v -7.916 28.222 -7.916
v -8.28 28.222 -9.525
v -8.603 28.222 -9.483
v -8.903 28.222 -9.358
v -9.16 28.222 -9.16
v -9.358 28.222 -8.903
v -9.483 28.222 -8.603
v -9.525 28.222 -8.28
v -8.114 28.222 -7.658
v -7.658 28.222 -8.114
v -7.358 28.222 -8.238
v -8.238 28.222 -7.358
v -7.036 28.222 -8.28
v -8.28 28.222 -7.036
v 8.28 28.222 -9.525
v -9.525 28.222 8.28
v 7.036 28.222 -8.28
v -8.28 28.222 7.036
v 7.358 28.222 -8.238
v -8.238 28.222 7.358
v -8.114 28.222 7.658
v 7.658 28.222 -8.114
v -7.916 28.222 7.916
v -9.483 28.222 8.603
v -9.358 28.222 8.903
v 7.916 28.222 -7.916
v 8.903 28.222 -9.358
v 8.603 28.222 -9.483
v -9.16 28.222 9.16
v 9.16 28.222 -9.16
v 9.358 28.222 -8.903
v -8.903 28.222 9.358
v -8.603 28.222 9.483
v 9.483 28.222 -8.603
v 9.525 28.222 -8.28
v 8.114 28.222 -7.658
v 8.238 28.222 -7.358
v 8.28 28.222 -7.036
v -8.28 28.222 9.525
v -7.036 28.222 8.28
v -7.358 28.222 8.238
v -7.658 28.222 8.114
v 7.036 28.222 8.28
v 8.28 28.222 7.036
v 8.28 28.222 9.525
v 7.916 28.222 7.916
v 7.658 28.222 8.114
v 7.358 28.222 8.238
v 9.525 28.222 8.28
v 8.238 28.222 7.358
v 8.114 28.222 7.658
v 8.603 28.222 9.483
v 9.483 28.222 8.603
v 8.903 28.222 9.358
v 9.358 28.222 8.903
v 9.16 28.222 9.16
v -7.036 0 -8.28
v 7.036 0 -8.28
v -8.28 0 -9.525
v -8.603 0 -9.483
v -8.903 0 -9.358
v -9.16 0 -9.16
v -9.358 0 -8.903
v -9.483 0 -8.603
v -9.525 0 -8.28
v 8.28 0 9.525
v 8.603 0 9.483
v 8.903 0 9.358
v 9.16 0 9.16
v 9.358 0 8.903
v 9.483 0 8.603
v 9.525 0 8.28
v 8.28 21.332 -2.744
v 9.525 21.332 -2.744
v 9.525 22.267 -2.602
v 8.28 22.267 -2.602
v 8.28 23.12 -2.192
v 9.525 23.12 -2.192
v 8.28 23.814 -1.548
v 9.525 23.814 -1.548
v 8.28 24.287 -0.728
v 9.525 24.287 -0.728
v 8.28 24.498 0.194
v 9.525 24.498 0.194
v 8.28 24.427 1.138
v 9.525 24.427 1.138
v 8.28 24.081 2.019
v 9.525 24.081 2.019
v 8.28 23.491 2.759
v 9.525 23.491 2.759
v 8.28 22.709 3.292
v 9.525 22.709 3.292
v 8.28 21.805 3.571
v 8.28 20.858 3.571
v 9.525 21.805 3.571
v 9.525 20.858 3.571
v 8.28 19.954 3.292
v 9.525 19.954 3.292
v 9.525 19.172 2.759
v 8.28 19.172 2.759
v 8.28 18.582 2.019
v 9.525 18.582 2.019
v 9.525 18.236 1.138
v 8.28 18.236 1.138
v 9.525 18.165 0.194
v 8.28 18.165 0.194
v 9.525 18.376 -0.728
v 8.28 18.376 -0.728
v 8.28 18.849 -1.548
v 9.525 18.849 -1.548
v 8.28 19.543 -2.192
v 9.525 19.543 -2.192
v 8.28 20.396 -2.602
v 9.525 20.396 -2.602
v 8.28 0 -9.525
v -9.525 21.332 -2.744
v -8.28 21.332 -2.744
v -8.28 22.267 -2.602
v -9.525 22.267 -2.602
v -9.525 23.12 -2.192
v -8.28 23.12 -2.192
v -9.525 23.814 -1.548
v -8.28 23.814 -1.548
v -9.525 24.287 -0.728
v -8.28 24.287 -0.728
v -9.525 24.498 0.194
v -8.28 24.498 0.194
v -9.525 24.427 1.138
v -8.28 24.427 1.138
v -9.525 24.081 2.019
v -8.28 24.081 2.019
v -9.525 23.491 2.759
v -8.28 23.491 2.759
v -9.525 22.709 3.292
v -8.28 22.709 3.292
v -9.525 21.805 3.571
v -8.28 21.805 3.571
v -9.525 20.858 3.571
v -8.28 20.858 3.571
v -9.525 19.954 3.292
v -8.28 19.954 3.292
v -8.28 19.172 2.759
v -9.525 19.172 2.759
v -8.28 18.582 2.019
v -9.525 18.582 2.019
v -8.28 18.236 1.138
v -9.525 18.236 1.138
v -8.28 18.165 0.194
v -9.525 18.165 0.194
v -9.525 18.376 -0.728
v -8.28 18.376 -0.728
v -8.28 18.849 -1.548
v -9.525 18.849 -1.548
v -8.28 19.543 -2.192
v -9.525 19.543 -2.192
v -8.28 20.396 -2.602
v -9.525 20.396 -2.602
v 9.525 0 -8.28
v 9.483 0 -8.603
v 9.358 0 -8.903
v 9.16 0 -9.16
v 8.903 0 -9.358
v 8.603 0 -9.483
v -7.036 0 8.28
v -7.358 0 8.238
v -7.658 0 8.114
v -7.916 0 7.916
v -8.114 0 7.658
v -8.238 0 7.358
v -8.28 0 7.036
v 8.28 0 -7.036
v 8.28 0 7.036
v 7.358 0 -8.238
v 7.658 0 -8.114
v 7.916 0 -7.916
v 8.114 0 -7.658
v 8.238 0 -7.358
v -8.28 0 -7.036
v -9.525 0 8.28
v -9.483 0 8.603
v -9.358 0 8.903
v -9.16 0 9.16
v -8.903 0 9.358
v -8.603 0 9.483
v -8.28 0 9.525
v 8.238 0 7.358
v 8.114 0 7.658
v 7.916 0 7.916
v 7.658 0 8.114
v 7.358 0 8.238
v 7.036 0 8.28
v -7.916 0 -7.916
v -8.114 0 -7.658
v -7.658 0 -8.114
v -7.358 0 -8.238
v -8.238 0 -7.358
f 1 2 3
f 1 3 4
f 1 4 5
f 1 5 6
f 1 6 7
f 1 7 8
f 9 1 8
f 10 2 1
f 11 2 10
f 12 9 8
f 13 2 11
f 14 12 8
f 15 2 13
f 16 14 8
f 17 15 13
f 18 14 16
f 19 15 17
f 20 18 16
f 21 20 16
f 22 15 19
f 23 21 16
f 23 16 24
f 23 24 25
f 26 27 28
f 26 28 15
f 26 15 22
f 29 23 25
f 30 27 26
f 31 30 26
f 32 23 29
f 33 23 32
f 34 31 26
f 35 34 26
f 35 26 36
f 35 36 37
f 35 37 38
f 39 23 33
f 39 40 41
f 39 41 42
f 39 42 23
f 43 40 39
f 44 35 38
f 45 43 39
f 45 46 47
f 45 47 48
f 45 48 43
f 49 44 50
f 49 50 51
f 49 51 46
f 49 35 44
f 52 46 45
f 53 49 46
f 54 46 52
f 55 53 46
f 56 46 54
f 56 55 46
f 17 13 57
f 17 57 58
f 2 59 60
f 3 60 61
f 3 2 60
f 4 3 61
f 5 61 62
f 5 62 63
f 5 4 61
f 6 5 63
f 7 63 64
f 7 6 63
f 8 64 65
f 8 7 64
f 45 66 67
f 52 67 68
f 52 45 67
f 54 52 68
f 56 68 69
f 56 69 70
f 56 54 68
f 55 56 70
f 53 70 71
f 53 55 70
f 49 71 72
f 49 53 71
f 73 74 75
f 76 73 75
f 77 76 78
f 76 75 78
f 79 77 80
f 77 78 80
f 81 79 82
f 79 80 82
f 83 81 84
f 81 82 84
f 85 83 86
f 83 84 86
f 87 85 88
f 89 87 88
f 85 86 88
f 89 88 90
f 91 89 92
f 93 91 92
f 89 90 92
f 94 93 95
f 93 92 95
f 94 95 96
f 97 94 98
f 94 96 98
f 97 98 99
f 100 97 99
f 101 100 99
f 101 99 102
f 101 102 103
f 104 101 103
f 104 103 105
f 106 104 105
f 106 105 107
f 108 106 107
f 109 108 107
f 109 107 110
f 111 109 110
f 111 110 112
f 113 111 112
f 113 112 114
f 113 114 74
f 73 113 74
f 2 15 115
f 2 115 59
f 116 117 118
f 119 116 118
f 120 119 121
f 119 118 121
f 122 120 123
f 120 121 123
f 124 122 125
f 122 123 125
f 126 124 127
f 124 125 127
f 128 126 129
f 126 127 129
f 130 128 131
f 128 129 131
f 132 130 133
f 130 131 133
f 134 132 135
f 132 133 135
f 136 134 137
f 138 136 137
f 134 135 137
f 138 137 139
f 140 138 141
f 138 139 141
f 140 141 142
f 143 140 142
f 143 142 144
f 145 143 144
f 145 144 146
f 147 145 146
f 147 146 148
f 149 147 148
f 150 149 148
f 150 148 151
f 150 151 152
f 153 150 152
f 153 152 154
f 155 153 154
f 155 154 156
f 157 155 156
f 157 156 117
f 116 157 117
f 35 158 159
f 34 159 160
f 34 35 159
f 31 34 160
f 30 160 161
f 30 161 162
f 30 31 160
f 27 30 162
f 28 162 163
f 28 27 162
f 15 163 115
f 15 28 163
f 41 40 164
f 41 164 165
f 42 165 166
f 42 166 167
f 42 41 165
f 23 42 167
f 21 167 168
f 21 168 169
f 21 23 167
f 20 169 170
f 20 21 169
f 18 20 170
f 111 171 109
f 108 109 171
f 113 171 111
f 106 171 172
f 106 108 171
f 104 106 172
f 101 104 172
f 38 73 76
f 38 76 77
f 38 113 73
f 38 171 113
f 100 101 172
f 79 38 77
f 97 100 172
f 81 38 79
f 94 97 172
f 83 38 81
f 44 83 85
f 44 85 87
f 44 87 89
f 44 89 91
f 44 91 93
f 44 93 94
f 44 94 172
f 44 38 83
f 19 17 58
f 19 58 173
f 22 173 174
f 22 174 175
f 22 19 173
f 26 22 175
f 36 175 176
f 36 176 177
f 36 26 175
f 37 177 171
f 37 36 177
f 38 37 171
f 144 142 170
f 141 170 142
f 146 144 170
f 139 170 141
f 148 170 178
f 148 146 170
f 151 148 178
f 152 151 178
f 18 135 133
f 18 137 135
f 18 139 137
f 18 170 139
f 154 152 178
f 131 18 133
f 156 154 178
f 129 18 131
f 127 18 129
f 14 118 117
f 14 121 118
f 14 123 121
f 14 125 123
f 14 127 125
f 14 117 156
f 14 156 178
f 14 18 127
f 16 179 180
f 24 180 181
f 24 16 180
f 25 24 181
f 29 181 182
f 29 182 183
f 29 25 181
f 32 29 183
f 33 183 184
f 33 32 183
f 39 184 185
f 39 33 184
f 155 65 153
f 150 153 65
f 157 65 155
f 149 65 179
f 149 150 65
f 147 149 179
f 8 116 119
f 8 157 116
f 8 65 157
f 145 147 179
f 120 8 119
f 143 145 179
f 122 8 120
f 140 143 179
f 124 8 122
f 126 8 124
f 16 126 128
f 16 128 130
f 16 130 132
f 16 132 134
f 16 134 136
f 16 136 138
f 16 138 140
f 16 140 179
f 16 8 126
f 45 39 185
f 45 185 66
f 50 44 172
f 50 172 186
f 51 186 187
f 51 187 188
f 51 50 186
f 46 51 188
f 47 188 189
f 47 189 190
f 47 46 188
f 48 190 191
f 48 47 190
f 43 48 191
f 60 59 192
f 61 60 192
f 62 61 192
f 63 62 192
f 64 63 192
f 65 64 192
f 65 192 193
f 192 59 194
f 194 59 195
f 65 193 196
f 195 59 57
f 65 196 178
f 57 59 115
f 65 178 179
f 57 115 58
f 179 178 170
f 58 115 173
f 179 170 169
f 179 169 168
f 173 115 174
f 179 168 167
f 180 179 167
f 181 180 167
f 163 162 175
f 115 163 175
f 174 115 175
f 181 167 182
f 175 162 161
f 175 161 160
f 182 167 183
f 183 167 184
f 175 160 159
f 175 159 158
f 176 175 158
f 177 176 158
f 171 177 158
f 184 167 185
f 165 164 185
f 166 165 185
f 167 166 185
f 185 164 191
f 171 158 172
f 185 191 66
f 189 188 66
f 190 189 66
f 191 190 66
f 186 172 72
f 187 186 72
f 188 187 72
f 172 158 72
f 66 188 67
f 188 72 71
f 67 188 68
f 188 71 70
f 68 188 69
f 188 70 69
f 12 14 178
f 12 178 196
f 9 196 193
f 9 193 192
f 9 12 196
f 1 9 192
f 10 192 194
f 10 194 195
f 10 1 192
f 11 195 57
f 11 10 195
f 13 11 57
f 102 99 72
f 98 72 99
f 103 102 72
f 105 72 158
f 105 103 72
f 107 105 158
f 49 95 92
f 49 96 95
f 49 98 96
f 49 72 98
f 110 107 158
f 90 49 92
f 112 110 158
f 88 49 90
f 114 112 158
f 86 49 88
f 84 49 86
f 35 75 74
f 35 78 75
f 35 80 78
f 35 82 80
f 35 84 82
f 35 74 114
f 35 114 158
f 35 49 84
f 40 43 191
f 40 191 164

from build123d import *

# Parameters (mm, degrees)
SQUARE_TUBE_75X049_1_DEPTH = 28.221723784
SKETCH3_R                  = 3.175
CUT_EXTRUDE1_DEPTH         = 36.356665826


with BuildPart() as part:
    # Sketch1 → Square tube 75X049(1) (new body)
    with BuildSketch(Plane(origin=(0, 28.221723784, 0), x_dir=(0, 0, -1), z_dir=(0, -1, 0))):
        with BuildLine():
            Line((-8.2804, 9.525), (8.2804, 9.525))
            ThreePointArc((8.2804, 9.525), (9.1604651, 9.1604651), (9.525, 8.2804))
            Line((9.525, 8.2804), (9.525, -8.2804))
            ThreePointArc((9.525, -8.2804), (9.1604651, -9.1604651), (8.2804, -9.525))
            Line((8.2804, -9.525), (-8.2804, -9.525))
            ThreePointArc((-8.2804, -9.525), (-9.1604651, -9.1604651), (-9.525, -8.2804))
            Line((-9.525, -8.2804), (-9.525, 8.2804))
            ThreePointArc((-9.525, 8.2804), (-9.1604651, 9.1604651), (-8.2804, 9.525))
        make_face()
        with BuildLine():
            Line((-8.2804, 7.0358), (-8.2804, -7.0358))
            ThreePointArc((-8.2804, -7.0358), (-7.9158651, -7.9158651), (-7.0358, -8.2804))
            Line((-7.0358, -8.2804), (7.0358, -8.2804))
            ThreePointArc((7.0358, -8.2804), (7.9158651, -7.9158651), (8.2804, -7.0358))
            Line((8.2804, -7.0358), (8.2804, 7.0358))
            ThreePointArc((8.2804, 7.0358), (7.9158651, 7.9158651), (7.0358, 8.2804))
            Line((7.0358, 8.2804), (-7.0358, 8.2804))
            ThreePointArc((-7.0358, 8.2804), (-7.9158651, 7.9158651), (-8.2804, 7.0358))
        make_face(mode=Mode.SUBTRACT)
    extrude(amount=SQUARE_TUBE_75X049_1_DEPTH)

    # Sketch3 → Cut-Extrude1 (cut, through all)
    with BuildSketch(Plane(origin=(9.525, 0, 0), x_dir=(0, 0, -1), z_dir=(1, 0, 0))):
        with Locations((-0.431467727, 21.331601206)):
            Circle(SKETCH3_R)
    extrude(amount=-CUT_EXTRUDE1_DEPTH, mode=Mode.SUBTRACT)


solid = part.part
